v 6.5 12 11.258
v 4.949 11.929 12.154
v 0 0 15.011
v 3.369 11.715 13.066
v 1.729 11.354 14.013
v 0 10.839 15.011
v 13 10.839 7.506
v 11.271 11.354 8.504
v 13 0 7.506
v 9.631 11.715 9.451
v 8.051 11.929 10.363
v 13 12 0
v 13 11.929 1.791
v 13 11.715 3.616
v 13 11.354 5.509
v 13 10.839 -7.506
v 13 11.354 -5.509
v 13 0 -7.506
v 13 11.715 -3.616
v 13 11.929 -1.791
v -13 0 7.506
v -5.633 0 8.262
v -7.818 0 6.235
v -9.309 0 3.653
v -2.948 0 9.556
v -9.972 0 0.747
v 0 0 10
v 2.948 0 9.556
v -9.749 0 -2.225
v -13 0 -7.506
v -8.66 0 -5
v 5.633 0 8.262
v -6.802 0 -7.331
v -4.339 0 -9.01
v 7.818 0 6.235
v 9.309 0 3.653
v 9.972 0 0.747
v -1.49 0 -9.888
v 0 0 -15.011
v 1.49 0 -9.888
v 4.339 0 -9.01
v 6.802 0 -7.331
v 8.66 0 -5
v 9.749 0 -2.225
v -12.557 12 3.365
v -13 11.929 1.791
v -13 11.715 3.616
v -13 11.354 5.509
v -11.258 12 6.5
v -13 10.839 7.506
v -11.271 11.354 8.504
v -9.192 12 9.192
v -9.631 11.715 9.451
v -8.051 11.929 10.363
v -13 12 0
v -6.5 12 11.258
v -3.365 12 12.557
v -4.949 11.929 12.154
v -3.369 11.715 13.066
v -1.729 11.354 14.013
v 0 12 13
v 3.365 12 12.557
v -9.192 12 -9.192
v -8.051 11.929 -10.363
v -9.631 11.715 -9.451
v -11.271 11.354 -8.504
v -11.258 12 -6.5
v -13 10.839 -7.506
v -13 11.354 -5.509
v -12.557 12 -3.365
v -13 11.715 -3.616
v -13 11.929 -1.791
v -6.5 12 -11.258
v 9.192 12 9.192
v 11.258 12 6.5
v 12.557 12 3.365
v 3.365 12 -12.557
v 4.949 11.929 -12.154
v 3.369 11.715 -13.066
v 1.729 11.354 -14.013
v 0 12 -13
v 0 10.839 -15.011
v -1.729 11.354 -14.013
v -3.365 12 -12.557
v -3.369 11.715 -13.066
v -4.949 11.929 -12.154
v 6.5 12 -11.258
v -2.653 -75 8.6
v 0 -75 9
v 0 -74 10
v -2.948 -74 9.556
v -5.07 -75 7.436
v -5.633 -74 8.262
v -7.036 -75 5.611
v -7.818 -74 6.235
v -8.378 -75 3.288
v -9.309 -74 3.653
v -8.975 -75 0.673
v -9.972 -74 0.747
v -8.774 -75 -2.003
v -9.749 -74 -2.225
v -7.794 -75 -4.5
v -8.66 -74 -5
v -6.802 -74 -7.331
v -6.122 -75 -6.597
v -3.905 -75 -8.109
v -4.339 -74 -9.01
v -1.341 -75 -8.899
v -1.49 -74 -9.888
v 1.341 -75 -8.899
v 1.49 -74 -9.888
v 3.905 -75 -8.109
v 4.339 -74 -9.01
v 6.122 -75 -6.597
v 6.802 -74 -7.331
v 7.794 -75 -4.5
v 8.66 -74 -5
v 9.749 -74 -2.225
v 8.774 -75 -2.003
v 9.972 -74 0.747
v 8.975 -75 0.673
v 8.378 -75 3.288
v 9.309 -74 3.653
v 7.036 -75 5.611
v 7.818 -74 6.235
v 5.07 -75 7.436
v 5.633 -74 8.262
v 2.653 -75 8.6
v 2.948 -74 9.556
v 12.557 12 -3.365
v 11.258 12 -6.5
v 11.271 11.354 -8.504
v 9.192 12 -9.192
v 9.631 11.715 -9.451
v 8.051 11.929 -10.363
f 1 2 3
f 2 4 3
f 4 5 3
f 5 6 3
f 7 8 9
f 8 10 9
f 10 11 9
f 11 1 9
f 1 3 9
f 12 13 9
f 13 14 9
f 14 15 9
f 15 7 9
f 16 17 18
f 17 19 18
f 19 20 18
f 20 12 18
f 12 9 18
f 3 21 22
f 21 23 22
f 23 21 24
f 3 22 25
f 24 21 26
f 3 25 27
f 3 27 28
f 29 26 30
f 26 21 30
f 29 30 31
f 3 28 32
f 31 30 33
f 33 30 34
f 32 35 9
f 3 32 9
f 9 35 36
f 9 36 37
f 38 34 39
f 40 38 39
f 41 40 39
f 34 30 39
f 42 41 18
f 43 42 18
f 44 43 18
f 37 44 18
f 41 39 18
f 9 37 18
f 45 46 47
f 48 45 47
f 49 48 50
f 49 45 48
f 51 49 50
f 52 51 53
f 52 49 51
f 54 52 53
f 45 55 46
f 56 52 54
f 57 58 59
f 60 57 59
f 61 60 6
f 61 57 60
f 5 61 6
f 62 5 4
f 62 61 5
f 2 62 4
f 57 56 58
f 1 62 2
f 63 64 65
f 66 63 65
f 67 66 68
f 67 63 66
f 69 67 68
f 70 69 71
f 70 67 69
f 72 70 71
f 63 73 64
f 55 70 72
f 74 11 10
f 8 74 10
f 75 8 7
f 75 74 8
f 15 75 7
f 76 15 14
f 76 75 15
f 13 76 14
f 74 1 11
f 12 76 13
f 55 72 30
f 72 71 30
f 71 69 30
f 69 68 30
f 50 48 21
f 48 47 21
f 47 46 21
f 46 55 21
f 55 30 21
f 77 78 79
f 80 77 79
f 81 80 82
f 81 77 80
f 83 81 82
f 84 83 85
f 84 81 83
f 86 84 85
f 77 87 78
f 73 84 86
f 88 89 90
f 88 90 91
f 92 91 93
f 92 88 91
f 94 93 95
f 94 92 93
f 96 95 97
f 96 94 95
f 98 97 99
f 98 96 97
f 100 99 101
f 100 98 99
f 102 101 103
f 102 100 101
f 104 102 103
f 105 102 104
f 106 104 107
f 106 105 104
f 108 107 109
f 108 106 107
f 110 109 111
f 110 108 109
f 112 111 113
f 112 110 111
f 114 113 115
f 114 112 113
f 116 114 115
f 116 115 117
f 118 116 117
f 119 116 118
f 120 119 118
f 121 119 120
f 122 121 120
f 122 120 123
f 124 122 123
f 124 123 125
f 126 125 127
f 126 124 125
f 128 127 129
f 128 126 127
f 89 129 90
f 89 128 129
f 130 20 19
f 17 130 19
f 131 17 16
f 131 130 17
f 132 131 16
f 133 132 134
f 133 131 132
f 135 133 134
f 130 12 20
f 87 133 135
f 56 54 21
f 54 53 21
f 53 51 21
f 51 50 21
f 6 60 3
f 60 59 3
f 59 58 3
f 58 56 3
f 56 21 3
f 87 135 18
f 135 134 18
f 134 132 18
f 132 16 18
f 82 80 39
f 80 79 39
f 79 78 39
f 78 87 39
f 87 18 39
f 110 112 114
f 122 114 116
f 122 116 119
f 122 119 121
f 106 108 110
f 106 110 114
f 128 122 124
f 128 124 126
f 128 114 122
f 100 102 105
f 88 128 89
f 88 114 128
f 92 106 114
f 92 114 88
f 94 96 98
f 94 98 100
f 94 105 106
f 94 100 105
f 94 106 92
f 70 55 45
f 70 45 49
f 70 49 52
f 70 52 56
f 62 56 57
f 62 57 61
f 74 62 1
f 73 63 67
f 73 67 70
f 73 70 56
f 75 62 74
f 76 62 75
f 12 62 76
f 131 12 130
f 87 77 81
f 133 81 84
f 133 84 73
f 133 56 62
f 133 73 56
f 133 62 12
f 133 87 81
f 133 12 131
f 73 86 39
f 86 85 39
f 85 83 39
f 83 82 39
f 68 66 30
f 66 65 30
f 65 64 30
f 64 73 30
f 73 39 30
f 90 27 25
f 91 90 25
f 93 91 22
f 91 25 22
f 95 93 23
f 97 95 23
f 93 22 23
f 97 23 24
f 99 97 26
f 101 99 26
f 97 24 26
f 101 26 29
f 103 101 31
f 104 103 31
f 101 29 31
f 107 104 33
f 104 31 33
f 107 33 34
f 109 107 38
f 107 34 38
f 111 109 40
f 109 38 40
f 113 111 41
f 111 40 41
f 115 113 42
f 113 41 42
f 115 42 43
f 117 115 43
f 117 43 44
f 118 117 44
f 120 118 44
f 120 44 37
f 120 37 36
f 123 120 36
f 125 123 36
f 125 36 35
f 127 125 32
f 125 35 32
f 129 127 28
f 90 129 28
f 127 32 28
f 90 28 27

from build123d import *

# Parameters (mm, degrees)
BOSS_EXTRUDE1_DEPTH = 12
SKETCH2_OUTSIDE_W   = 77.868
SKETCH2_OUTSIDE_H   = 81.89
SKETCH2_OUTSIDE_R   = 13
CUT_EXTRUDE2_DEPTH  = 12
CUT_EXTRUDE2_DRAFT  = -60
SKETCH3_R           = 10
BOSS_EXTRUDE2_DEPTH = 75
CHAMFER1_SIZE       = 1


with BuildPart() as part:
    # Sketch1 → Boss-Extrude1 (new body)
    with BuildSketch(Plane(origin=(0, 0, 0), x_dir=(1, 0, 0), z_dir=(0, 1, 0))):
        Polygon((13, 7.505553499), (0, 15.011106999), (-13, 7.505553499), (-13, -7.505553499), (0, -15.011106999), (13, -7.505553499), align=None)
    extrude(amount=BOSS_EXTRUDE1_DEPTH)


with BuildPart() as cut_extrude2_tool:
    # Sketch2 outside → Cut-Extrude2 (with draft: the straight prism first)
    with BuildSketch(Plane(origin=(0, 12, 0), x_dir=(1, 0, 0), z_dir=(0, 1, 0))):
        Rectangle(SKETCH2_OUTSIDE_W, SKETCH2_OUTSIDE_H)
        Circle(SKETCH2_OUTSIDE_R, mode=Mode.SUBTRACT)
    extrude(amount=-CUT_EXTRUDE2_DEPTH)
    # Cut-Extrude2: the draft: its side faces are tilted about the plane it starts from
    cut_extrude2_sides = [cut_extrude2_tool.faces().sort_by_distance(p)[0] for p in [
        (0, 6, 40.945),
        (38.934, 6, 0),
        (0, 6, -40.945),
        (-38.934, 6, 0),
        (-13, 6, 0),
    ]]
    draft(cut_extrude2_sides, Plane(origin=(0, 12, 0), x_dir=(1, 0, 0), z_dir=(0, 1, 0)), CUT_EXTRUDE2_DRAFT)


with BuildPart() as part_1:
    add(part.part)

    # Cut-Extrude2: cut by cut_extrude2_tool
    add(cut_extrude2_tool.part, mode=Mode.SUBTRACT)

    # Sketch3 → Boss-Extrude2 (add)
    with BuildSketch(Plane.XZ):
        with Locations(Location((0, 0, 0), (0, 0, 90))):
            Circle(SKETCH3_R)
    extrude(amount=BOSS_EXTRUDE2_DEPTH)

    # Chamfer1
    chamfer1_edges = [part_1.edges().sort_by_distance(p)[0] for p in [
        (0, -75, -10),
    ]]
    chamfer(chamfer1_edges, length=CHAMFER1_SIZE)


solid = part_1.part
